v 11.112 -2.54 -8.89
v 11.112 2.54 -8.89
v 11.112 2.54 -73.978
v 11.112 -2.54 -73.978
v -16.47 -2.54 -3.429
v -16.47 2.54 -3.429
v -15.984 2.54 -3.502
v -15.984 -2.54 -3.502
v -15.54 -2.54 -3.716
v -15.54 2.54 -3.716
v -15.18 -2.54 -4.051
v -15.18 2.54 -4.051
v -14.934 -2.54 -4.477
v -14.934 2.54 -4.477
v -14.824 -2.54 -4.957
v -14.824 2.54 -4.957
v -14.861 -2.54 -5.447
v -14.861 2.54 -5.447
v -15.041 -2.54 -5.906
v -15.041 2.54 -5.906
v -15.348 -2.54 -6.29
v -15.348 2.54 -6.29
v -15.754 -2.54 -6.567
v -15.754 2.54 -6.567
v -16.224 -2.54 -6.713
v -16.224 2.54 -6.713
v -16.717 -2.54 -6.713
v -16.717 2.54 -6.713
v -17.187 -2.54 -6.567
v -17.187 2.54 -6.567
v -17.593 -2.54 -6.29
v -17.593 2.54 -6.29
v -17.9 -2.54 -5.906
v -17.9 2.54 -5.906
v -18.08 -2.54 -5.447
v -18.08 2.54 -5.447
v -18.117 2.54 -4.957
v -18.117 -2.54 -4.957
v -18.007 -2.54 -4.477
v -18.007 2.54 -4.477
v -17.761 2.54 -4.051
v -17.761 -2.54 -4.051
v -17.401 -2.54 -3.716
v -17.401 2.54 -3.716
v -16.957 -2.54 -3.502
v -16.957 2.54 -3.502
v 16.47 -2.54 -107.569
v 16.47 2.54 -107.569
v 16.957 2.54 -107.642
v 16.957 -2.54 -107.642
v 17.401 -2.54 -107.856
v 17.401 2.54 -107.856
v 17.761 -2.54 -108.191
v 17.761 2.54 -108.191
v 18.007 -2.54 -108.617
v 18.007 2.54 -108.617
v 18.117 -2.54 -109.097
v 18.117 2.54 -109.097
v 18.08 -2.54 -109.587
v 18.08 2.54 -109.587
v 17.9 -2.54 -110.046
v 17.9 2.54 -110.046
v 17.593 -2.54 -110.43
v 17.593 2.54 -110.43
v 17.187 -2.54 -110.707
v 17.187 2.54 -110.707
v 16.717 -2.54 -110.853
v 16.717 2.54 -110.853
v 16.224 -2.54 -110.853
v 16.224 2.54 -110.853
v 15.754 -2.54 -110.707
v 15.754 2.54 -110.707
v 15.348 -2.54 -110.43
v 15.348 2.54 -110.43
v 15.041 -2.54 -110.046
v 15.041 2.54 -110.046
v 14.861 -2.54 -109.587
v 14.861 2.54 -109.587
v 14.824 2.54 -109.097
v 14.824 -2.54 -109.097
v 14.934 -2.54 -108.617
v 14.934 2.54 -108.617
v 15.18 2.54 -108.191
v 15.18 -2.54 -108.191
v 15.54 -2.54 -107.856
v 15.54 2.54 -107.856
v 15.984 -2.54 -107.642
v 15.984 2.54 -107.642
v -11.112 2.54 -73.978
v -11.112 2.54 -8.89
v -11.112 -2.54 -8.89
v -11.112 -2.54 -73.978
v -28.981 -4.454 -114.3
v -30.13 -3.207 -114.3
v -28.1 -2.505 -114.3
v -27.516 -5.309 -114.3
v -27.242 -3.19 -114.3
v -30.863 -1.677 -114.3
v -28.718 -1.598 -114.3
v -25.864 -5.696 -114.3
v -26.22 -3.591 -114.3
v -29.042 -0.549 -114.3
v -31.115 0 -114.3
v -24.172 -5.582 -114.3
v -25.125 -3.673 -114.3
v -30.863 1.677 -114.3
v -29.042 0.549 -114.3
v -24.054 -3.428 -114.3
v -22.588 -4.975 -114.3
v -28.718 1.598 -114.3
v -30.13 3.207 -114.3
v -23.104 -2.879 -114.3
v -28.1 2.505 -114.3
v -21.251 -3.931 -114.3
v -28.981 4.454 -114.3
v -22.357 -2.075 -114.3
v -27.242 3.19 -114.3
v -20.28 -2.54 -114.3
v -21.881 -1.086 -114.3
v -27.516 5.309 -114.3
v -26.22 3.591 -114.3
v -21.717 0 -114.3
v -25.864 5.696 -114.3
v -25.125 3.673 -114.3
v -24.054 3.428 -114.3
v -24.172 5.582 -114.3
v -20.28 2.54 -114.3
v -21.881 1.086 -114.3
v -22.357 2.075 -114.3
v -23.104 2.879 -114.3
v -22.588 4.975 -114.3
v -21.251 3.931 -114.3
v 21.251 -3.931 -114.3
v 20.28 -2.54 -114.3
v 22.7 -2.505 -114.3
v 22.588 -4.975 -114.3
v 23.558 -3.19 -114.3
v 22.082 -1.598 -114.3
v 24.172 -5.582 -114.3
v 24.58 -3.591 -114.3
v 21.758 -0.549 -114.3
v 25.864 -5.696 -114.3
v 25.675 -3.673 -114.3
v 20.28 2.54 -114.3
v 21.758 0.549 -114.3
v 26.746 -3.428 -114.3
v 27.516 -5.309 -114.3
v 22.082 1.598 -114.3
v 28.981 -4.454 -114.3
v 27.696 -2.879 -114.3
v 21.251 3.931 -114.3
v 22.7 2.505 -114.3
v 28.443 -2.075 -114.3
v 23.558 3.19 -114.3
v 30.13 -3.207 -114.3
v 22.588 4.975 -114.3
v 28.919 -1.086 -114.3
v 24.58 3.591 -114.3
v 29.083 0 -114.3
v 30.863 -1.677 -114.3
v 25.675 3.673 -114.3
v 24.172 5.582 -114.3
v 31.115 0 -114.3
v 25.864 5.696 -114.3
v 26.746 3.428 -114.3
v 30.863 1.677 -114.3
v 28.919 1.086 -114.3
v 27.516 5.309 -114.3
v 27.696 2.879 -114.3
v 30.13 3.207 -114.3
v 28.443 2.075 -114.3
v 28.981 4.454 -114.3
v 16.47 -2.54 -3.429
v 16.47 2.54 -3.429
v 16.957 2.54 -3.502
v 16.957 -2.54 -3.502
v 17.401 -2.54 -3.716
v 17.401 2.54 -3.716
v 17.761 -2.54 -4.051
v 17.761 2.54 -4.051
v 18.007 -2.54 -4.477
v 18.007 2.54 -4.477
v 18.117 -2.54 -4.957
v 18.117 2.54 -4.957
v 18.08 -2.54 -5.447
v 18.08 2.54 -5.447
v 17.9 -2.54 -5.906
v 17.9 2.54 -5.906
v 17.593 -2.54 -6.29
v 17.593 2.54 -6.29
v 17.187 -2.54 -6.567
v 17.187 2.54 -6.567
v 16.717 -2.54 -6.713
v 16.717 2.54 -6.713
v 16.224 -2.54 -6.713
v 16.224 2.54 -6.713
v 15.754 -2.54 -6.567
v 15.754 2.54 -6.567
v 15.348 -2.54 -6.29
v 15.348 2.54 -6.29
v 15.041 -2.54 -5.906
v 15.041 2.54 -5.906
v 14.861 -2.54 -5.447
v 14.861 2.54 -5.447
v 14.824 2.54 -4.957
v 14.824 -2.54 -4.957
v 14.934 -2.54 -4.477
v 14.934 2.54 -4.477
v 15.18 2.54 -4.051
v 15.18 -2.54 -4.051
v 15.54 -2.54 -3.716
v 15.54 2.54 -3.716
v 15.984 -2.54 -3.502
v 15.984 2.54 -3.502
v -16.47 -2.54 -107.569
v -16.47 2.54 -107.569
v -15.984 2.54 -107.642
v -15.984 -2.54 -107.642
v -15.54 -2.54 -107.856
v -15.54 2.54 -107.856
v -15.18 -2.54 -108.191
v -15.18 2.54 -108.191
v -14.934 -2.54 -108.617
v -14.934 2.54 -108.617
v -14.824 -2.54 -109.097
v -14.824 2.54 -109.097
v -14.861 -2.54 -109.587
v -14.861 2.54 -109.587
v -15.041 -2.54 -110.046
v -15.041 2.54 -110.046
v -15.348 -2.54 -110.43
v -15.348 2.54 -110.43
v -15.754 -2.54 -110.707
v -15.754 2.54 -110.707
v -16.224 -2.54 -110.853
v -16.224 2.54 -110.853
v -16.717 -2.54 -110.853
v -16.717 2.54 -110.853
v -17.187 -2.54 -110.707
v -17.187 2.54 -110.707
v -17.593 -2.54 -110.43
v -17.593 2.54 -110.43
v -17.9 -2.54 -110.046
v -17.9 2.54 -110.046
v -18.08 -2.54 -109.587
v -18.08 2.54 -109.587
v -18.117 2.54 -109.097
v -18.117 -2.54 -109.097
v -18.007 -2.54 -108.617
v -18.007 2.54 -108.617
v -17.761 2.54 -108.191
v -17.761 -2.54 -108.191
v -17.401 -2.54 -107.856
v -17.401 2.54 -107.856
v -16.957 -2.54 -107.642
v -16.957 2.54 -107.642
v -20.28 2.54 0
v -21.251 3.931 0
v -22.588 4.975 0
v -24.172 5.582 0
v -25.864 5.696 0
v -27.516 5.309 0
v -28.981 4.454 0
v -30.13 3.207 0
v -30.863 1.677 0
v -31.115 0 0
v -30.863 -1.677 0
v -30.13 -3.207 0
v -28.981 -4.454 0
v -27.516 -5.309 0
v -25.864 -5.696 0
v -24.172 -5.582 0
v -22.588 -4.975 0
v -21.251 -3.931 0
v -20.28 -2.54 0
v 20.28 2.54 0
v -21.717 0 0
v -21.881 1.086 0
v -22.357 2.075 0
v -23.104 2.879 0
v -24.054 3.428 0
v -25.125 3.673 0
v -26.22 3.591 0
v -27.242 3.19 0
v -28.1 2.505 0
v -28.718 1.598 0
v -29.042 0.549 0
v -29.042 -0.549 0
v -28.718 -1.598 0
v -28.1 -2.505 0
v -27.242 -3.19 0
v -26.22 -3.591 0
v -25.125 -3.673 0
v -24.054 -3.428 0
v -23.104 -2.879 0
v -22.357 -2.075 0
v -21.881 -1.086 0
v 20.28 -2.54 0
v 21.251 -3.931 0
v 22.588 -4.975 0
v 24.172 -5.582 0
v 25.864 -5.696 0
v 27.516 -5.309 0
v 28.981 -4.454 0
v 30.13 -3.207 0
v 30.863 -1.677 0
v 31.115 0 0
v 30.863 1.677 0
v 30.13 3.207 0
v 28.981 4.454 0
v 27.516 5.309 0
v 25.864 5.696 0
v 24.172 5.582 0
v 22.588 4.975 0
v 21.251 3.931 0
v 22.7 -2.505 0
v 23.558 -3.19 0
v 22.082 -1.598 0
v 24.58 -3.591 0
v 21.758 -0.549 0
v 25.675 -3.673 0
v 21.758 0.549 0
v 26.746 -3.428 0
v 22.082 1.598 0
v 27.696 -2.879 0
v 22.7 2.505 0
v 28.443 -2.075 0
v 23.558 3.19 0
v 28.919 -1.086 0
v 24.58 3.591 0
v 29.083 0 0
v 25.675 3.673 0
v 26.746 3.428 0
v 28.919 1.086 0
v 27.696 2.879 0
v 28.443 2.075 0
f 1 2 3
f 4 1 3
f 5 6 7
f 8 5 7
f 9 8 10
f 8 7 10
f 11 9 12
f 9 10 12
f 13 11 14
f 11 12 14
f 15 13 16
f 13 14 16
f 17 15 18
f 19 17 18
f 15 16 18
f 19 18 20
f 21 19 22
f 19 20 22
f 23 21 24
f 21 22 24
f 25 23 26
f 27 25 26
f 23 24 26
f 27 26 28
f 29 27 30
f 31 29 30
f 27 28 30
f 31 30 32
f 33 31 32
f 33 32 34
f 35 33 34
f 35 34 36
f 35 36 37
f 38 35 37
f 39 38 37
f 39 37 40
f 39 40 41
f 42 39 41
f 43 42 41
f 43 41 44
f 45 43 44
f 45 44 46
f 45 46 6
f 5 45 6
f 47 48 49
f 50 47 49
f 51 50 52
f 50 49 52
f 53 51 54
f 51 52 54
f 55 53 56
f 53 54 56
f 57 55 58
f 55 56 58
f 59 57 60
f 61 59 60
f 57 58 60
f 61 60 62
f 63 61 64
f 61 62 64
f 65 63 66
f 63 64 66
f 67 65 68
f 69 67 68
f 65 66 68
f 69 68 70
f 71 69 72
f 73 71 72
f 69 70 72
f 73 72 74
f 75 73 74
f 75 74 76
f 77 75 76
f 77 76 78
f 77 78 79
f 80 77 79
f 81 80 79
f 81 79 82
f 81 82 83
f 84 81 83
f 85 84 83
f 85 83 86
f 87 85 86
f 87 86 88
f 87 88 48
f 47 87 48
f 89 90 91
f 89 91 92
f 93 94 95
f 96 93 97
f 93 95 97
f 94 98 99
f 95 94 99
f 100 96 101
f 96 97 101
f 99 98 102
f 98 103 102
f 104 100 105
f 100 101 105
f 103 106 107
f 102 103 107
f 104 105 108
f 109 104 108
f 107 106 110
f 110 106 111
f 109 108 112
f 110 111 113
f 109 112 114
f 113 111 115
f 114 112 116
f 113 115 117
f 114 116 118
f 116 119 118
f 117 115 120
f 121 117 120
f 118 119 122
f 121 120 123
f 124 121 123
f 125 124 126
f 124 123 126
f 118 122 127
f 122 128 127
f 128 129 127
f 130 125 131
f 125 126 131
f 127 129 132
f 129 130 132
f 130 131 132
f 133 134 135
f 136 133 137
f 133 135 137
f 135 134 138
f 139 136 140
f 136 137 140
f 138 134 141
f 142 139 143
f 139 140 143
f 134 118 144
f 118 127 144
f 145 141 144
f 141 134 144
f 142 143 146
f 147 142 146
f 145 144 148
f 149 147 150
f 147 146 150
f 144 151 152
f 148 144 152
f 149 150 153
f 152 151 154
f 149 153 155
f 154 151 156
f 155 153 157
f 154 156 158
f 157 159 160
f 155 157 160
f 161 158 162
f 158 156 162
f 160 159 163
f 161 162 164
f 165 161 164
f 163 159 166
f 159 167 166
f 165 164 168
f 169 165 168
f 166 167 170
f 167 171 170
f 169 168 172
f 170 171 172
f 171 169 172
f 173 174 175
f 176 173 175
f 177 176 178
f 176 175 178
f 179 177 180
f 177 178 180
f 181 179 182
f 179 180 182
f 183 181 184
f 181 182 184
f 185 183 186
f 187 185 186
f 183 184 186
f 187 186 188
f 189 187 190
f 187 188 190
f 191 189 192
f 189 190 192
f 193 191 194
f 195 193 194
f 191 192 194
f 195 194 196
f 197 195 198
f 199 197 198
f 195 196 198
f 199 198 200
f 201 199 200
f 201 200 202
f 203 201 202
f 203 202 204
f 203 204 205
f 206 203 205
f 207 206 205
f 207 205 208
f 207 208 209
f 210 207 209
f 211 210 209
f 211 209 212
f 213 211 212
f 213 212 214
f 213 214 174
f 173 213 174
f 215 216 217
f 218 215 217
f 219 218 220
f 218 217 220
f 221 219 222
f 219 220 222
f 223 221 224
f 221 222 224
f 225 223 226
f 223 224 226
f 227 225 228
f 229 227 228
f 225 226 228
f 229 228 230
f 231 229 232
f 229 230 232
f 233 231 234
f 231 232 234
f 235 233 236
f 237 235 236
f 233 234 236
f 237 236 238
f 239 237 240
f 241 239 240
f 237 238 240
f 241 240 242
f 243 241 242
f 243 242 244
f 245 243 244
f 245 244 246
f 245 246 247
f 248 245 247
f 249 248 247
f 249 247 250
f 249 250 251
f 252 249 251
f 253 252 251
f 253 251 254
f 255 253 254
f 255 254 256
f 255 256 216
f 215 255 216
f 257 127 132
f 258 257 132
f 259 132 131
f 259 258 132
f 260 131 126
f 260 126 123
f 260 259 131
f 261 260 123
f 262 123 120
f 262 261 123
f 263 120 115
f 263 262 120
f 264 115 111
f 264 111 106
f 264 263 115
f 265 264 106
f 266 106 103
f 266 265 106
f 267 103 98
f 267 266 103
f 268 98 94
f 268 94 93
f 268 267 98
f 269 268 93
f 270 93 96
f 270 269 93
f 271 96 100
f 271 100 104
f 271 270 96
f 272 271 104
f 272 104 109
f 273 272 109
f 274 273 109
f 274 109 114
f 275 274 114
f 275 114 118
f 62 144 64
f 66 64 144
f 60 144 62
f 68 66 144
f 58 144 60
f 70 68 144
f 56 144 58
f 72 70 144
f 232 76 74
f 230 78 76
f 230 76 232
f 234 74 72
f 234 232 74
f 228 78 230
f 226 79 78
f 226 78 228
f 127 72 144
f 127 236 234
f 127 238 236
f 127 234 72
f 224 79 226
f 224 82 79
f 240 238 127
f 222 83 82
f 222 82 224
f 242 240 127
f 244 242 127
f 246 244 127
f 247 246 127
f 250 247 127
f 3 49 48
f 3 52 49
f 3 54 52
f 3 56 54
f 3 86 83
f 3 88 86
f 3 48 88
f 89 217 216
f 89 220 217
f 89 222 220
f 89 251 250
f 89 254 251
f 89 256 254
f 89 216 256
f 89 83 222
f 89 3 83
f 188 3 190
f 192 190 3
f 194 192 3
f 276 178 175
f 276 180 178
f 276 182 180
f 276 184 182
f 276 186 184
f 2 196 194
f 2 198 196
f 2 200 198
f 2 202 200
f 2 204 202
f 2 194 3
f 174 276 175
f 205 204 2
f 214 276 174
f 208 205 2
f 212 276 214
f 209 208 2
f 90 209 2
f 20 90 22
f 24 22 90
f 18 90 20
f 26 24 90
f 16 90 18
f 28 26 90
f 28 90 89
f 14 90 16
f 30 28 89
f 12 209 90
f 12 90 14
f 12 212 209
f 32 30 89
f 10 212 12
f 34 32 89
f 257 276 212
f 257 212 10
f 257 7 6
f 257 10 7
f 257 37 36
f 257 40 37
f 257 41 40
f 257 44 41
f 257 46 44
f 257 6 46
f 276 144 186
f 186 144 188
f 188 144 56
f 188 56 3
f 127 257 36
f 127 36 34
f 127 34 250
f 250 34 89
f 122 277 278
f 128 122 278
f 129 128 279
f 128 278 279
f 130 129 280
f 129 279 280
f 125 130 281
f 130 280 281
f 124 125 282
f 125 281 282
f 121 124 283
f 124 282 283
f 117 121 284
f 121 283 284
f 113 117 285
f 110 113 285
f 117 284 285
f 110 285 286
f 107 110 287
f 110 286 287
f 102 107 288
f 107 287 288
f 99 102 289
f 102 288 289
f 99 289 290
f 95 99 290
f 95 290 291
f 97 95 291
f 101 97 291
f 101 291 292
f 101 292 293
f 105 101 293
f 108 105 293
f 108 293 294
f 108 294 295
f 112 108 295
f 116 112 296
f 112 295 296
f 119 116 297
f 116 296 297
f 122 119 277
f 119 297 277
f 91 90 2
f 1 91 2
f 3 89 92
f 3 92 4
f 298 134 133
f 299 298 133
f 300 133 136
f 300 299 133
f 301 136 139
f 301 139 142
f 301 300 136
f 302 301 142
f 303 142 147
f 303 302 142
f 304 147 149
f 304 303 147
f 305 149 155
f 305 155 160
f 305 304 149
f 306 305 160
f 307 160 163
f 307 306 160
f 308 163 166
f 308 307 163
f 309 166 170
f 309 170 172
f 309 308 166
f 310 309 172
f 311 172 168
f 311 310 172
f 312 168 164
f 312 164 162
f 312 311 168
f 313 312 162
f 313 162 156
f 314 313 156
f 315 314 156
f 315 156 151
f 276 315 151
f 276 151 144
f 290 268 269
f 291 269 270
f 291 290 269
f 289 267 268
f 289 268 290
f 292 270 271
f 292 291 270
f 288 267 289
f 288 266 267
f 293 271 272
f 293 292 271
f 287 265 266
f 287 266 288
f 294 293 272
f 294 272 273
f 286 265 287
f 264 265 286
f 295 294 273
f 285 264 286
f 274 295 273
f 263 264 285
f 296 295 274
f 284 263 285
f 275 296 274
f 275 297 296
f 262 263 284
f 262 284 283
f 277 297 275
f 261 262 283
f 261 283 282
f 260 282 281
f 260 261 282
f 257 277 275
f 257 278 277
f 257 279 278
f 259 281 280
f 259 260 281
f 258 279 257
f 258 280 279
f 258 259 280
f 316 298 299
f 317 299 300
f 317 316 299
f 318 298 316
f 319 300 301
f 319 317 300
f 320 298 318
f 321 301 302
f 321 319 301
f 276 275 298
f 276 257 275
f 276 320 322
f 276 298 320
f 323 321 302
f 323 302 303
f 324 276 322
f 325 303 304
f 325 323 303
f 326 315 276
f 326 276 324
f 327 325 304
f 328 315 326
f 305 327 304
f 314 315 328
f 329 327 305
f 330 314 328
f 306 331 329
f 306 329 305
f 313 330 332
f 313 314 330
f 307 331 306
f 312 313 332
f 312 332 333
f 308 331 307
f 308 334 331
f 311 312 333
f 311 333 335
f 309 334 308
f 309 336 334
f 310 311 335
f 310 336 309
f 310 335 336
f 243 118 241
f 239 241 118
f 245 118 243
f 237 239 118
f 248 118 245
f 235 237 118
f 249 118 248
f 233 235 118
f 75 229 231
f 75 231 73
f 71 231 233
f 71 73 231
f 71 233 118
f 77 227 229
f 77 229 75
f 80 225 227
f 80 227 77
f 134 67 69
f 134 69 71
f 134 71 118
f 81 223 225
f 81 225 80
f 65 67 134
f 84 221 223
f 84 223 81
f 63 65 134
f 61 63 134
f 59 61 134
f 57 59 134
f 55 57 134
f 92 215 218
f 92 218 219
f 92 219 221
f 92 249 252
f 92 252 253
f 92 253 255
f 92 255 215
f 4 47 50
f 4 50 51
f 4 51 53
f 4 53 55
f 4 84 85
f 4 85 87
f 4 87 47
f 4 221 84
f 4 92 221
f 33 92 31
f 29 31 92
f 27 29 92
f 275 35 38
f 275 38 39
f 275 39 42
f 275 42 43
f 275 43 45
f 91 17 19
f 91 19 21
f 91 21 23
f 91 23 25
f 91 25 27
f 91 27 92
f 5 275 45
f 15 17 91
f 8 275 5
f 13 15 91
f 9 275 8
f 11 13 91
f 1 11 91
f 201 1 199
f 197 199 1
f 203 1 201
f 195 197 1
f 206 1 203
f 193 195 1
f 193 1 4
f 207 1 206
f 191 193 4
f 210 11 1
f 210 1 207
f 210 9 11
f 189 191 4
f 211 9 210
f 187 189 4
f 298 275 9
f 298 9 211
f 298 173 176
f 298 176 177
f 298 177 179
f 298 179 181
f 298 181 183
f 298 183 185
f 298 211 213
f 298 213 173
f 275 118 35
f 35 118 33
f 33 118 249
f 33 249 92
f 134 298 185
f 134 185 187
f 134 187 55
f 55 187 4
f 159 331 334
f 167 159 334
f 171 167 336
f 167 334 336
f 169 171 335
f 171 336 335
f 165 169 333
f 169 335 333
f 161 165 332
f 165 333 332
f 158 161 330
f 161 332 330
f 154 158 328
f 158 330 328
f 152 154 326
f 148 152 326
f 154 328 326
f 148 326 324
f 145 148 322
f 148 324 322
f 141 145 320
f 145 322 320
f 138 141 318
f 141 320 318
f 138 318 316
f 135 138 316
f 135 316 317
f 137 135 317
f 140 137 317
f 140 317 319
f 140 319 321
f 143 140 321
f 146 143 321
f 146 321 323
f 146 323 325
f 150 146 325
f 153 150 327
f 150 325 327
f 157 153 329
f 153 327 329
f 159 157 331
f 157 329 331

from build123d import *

# Parameters (mm, degrees)
SKETCH1_R           = 3.683
BOSS_EXTRUDE1_DEPTH = 114.3
SKETCH2_R           = 1.651
SKETCH2_W           = 22.225
SKETCH2_H           = 65.0875
CUT_EXTRUDE1_DEPTH  = 114.3


with BuildPart() as part:
    # Sketch1 → Boss-Extrude1 (new body)
    with BuildSketch(Plane.XY):
        with BuildLine():
            ThreePointArc((-20.28046633, 2.54), (-31.115, 0), (-20.28046633, -2.54))
            Line((-20.28046633, -2.54), (20.28046633, -2.54))
            ThreePointArc((20.28046633, -2.54), (31.115, 0), (20.28046633, 2.54))
            Line((20.28046633, 2.54), (-20.28046633, 2.54))
        make_face()
        with Locations((-25.4, 0)):
            Circle(SKETCH1_R, mode=Mode.SUBTRACT)
        with Locations((25.4, 0)):
            Circle(SKETCH1_R, mode=Mode.SUBTRACT)
    extrude(amount=-BOSS_EXTRUDE1_DEPTH)

    # Sketch2 → Cut-Extrude1 (cut)
    with BuildSketch(Plane(origin=(0, 2.54, 0), x_dir=(1, 0, 0), z_dir=(0, 1, 0))):
        with Locations(Location((-16.47046633, 109.22, 0), (0, 0, 270))):
            Circle(SKETCH2_R)
        with Locations(Location((16.47046633, 109.22, 0), (0, 0, 270))):
            Circle(SKETCH2_R)
        with Locations(Location((-16.47046633, 5.08, 0), (0, 0, 270))):
            Circle(SKETCH2_R)
        with Locations(Location((16.47046633, 5.08, 0), (0, 0, 270))):
            Circle(SKETCH2_R)
        with Locations((0, 41.43375)):
            Rectangle(SKETCH2_W, SKETCH2_H)
    extrude(amount=-CUT_EXTRUDE1_DEPTH, mode=Mode.SUBTRACT)


solid = part.part
